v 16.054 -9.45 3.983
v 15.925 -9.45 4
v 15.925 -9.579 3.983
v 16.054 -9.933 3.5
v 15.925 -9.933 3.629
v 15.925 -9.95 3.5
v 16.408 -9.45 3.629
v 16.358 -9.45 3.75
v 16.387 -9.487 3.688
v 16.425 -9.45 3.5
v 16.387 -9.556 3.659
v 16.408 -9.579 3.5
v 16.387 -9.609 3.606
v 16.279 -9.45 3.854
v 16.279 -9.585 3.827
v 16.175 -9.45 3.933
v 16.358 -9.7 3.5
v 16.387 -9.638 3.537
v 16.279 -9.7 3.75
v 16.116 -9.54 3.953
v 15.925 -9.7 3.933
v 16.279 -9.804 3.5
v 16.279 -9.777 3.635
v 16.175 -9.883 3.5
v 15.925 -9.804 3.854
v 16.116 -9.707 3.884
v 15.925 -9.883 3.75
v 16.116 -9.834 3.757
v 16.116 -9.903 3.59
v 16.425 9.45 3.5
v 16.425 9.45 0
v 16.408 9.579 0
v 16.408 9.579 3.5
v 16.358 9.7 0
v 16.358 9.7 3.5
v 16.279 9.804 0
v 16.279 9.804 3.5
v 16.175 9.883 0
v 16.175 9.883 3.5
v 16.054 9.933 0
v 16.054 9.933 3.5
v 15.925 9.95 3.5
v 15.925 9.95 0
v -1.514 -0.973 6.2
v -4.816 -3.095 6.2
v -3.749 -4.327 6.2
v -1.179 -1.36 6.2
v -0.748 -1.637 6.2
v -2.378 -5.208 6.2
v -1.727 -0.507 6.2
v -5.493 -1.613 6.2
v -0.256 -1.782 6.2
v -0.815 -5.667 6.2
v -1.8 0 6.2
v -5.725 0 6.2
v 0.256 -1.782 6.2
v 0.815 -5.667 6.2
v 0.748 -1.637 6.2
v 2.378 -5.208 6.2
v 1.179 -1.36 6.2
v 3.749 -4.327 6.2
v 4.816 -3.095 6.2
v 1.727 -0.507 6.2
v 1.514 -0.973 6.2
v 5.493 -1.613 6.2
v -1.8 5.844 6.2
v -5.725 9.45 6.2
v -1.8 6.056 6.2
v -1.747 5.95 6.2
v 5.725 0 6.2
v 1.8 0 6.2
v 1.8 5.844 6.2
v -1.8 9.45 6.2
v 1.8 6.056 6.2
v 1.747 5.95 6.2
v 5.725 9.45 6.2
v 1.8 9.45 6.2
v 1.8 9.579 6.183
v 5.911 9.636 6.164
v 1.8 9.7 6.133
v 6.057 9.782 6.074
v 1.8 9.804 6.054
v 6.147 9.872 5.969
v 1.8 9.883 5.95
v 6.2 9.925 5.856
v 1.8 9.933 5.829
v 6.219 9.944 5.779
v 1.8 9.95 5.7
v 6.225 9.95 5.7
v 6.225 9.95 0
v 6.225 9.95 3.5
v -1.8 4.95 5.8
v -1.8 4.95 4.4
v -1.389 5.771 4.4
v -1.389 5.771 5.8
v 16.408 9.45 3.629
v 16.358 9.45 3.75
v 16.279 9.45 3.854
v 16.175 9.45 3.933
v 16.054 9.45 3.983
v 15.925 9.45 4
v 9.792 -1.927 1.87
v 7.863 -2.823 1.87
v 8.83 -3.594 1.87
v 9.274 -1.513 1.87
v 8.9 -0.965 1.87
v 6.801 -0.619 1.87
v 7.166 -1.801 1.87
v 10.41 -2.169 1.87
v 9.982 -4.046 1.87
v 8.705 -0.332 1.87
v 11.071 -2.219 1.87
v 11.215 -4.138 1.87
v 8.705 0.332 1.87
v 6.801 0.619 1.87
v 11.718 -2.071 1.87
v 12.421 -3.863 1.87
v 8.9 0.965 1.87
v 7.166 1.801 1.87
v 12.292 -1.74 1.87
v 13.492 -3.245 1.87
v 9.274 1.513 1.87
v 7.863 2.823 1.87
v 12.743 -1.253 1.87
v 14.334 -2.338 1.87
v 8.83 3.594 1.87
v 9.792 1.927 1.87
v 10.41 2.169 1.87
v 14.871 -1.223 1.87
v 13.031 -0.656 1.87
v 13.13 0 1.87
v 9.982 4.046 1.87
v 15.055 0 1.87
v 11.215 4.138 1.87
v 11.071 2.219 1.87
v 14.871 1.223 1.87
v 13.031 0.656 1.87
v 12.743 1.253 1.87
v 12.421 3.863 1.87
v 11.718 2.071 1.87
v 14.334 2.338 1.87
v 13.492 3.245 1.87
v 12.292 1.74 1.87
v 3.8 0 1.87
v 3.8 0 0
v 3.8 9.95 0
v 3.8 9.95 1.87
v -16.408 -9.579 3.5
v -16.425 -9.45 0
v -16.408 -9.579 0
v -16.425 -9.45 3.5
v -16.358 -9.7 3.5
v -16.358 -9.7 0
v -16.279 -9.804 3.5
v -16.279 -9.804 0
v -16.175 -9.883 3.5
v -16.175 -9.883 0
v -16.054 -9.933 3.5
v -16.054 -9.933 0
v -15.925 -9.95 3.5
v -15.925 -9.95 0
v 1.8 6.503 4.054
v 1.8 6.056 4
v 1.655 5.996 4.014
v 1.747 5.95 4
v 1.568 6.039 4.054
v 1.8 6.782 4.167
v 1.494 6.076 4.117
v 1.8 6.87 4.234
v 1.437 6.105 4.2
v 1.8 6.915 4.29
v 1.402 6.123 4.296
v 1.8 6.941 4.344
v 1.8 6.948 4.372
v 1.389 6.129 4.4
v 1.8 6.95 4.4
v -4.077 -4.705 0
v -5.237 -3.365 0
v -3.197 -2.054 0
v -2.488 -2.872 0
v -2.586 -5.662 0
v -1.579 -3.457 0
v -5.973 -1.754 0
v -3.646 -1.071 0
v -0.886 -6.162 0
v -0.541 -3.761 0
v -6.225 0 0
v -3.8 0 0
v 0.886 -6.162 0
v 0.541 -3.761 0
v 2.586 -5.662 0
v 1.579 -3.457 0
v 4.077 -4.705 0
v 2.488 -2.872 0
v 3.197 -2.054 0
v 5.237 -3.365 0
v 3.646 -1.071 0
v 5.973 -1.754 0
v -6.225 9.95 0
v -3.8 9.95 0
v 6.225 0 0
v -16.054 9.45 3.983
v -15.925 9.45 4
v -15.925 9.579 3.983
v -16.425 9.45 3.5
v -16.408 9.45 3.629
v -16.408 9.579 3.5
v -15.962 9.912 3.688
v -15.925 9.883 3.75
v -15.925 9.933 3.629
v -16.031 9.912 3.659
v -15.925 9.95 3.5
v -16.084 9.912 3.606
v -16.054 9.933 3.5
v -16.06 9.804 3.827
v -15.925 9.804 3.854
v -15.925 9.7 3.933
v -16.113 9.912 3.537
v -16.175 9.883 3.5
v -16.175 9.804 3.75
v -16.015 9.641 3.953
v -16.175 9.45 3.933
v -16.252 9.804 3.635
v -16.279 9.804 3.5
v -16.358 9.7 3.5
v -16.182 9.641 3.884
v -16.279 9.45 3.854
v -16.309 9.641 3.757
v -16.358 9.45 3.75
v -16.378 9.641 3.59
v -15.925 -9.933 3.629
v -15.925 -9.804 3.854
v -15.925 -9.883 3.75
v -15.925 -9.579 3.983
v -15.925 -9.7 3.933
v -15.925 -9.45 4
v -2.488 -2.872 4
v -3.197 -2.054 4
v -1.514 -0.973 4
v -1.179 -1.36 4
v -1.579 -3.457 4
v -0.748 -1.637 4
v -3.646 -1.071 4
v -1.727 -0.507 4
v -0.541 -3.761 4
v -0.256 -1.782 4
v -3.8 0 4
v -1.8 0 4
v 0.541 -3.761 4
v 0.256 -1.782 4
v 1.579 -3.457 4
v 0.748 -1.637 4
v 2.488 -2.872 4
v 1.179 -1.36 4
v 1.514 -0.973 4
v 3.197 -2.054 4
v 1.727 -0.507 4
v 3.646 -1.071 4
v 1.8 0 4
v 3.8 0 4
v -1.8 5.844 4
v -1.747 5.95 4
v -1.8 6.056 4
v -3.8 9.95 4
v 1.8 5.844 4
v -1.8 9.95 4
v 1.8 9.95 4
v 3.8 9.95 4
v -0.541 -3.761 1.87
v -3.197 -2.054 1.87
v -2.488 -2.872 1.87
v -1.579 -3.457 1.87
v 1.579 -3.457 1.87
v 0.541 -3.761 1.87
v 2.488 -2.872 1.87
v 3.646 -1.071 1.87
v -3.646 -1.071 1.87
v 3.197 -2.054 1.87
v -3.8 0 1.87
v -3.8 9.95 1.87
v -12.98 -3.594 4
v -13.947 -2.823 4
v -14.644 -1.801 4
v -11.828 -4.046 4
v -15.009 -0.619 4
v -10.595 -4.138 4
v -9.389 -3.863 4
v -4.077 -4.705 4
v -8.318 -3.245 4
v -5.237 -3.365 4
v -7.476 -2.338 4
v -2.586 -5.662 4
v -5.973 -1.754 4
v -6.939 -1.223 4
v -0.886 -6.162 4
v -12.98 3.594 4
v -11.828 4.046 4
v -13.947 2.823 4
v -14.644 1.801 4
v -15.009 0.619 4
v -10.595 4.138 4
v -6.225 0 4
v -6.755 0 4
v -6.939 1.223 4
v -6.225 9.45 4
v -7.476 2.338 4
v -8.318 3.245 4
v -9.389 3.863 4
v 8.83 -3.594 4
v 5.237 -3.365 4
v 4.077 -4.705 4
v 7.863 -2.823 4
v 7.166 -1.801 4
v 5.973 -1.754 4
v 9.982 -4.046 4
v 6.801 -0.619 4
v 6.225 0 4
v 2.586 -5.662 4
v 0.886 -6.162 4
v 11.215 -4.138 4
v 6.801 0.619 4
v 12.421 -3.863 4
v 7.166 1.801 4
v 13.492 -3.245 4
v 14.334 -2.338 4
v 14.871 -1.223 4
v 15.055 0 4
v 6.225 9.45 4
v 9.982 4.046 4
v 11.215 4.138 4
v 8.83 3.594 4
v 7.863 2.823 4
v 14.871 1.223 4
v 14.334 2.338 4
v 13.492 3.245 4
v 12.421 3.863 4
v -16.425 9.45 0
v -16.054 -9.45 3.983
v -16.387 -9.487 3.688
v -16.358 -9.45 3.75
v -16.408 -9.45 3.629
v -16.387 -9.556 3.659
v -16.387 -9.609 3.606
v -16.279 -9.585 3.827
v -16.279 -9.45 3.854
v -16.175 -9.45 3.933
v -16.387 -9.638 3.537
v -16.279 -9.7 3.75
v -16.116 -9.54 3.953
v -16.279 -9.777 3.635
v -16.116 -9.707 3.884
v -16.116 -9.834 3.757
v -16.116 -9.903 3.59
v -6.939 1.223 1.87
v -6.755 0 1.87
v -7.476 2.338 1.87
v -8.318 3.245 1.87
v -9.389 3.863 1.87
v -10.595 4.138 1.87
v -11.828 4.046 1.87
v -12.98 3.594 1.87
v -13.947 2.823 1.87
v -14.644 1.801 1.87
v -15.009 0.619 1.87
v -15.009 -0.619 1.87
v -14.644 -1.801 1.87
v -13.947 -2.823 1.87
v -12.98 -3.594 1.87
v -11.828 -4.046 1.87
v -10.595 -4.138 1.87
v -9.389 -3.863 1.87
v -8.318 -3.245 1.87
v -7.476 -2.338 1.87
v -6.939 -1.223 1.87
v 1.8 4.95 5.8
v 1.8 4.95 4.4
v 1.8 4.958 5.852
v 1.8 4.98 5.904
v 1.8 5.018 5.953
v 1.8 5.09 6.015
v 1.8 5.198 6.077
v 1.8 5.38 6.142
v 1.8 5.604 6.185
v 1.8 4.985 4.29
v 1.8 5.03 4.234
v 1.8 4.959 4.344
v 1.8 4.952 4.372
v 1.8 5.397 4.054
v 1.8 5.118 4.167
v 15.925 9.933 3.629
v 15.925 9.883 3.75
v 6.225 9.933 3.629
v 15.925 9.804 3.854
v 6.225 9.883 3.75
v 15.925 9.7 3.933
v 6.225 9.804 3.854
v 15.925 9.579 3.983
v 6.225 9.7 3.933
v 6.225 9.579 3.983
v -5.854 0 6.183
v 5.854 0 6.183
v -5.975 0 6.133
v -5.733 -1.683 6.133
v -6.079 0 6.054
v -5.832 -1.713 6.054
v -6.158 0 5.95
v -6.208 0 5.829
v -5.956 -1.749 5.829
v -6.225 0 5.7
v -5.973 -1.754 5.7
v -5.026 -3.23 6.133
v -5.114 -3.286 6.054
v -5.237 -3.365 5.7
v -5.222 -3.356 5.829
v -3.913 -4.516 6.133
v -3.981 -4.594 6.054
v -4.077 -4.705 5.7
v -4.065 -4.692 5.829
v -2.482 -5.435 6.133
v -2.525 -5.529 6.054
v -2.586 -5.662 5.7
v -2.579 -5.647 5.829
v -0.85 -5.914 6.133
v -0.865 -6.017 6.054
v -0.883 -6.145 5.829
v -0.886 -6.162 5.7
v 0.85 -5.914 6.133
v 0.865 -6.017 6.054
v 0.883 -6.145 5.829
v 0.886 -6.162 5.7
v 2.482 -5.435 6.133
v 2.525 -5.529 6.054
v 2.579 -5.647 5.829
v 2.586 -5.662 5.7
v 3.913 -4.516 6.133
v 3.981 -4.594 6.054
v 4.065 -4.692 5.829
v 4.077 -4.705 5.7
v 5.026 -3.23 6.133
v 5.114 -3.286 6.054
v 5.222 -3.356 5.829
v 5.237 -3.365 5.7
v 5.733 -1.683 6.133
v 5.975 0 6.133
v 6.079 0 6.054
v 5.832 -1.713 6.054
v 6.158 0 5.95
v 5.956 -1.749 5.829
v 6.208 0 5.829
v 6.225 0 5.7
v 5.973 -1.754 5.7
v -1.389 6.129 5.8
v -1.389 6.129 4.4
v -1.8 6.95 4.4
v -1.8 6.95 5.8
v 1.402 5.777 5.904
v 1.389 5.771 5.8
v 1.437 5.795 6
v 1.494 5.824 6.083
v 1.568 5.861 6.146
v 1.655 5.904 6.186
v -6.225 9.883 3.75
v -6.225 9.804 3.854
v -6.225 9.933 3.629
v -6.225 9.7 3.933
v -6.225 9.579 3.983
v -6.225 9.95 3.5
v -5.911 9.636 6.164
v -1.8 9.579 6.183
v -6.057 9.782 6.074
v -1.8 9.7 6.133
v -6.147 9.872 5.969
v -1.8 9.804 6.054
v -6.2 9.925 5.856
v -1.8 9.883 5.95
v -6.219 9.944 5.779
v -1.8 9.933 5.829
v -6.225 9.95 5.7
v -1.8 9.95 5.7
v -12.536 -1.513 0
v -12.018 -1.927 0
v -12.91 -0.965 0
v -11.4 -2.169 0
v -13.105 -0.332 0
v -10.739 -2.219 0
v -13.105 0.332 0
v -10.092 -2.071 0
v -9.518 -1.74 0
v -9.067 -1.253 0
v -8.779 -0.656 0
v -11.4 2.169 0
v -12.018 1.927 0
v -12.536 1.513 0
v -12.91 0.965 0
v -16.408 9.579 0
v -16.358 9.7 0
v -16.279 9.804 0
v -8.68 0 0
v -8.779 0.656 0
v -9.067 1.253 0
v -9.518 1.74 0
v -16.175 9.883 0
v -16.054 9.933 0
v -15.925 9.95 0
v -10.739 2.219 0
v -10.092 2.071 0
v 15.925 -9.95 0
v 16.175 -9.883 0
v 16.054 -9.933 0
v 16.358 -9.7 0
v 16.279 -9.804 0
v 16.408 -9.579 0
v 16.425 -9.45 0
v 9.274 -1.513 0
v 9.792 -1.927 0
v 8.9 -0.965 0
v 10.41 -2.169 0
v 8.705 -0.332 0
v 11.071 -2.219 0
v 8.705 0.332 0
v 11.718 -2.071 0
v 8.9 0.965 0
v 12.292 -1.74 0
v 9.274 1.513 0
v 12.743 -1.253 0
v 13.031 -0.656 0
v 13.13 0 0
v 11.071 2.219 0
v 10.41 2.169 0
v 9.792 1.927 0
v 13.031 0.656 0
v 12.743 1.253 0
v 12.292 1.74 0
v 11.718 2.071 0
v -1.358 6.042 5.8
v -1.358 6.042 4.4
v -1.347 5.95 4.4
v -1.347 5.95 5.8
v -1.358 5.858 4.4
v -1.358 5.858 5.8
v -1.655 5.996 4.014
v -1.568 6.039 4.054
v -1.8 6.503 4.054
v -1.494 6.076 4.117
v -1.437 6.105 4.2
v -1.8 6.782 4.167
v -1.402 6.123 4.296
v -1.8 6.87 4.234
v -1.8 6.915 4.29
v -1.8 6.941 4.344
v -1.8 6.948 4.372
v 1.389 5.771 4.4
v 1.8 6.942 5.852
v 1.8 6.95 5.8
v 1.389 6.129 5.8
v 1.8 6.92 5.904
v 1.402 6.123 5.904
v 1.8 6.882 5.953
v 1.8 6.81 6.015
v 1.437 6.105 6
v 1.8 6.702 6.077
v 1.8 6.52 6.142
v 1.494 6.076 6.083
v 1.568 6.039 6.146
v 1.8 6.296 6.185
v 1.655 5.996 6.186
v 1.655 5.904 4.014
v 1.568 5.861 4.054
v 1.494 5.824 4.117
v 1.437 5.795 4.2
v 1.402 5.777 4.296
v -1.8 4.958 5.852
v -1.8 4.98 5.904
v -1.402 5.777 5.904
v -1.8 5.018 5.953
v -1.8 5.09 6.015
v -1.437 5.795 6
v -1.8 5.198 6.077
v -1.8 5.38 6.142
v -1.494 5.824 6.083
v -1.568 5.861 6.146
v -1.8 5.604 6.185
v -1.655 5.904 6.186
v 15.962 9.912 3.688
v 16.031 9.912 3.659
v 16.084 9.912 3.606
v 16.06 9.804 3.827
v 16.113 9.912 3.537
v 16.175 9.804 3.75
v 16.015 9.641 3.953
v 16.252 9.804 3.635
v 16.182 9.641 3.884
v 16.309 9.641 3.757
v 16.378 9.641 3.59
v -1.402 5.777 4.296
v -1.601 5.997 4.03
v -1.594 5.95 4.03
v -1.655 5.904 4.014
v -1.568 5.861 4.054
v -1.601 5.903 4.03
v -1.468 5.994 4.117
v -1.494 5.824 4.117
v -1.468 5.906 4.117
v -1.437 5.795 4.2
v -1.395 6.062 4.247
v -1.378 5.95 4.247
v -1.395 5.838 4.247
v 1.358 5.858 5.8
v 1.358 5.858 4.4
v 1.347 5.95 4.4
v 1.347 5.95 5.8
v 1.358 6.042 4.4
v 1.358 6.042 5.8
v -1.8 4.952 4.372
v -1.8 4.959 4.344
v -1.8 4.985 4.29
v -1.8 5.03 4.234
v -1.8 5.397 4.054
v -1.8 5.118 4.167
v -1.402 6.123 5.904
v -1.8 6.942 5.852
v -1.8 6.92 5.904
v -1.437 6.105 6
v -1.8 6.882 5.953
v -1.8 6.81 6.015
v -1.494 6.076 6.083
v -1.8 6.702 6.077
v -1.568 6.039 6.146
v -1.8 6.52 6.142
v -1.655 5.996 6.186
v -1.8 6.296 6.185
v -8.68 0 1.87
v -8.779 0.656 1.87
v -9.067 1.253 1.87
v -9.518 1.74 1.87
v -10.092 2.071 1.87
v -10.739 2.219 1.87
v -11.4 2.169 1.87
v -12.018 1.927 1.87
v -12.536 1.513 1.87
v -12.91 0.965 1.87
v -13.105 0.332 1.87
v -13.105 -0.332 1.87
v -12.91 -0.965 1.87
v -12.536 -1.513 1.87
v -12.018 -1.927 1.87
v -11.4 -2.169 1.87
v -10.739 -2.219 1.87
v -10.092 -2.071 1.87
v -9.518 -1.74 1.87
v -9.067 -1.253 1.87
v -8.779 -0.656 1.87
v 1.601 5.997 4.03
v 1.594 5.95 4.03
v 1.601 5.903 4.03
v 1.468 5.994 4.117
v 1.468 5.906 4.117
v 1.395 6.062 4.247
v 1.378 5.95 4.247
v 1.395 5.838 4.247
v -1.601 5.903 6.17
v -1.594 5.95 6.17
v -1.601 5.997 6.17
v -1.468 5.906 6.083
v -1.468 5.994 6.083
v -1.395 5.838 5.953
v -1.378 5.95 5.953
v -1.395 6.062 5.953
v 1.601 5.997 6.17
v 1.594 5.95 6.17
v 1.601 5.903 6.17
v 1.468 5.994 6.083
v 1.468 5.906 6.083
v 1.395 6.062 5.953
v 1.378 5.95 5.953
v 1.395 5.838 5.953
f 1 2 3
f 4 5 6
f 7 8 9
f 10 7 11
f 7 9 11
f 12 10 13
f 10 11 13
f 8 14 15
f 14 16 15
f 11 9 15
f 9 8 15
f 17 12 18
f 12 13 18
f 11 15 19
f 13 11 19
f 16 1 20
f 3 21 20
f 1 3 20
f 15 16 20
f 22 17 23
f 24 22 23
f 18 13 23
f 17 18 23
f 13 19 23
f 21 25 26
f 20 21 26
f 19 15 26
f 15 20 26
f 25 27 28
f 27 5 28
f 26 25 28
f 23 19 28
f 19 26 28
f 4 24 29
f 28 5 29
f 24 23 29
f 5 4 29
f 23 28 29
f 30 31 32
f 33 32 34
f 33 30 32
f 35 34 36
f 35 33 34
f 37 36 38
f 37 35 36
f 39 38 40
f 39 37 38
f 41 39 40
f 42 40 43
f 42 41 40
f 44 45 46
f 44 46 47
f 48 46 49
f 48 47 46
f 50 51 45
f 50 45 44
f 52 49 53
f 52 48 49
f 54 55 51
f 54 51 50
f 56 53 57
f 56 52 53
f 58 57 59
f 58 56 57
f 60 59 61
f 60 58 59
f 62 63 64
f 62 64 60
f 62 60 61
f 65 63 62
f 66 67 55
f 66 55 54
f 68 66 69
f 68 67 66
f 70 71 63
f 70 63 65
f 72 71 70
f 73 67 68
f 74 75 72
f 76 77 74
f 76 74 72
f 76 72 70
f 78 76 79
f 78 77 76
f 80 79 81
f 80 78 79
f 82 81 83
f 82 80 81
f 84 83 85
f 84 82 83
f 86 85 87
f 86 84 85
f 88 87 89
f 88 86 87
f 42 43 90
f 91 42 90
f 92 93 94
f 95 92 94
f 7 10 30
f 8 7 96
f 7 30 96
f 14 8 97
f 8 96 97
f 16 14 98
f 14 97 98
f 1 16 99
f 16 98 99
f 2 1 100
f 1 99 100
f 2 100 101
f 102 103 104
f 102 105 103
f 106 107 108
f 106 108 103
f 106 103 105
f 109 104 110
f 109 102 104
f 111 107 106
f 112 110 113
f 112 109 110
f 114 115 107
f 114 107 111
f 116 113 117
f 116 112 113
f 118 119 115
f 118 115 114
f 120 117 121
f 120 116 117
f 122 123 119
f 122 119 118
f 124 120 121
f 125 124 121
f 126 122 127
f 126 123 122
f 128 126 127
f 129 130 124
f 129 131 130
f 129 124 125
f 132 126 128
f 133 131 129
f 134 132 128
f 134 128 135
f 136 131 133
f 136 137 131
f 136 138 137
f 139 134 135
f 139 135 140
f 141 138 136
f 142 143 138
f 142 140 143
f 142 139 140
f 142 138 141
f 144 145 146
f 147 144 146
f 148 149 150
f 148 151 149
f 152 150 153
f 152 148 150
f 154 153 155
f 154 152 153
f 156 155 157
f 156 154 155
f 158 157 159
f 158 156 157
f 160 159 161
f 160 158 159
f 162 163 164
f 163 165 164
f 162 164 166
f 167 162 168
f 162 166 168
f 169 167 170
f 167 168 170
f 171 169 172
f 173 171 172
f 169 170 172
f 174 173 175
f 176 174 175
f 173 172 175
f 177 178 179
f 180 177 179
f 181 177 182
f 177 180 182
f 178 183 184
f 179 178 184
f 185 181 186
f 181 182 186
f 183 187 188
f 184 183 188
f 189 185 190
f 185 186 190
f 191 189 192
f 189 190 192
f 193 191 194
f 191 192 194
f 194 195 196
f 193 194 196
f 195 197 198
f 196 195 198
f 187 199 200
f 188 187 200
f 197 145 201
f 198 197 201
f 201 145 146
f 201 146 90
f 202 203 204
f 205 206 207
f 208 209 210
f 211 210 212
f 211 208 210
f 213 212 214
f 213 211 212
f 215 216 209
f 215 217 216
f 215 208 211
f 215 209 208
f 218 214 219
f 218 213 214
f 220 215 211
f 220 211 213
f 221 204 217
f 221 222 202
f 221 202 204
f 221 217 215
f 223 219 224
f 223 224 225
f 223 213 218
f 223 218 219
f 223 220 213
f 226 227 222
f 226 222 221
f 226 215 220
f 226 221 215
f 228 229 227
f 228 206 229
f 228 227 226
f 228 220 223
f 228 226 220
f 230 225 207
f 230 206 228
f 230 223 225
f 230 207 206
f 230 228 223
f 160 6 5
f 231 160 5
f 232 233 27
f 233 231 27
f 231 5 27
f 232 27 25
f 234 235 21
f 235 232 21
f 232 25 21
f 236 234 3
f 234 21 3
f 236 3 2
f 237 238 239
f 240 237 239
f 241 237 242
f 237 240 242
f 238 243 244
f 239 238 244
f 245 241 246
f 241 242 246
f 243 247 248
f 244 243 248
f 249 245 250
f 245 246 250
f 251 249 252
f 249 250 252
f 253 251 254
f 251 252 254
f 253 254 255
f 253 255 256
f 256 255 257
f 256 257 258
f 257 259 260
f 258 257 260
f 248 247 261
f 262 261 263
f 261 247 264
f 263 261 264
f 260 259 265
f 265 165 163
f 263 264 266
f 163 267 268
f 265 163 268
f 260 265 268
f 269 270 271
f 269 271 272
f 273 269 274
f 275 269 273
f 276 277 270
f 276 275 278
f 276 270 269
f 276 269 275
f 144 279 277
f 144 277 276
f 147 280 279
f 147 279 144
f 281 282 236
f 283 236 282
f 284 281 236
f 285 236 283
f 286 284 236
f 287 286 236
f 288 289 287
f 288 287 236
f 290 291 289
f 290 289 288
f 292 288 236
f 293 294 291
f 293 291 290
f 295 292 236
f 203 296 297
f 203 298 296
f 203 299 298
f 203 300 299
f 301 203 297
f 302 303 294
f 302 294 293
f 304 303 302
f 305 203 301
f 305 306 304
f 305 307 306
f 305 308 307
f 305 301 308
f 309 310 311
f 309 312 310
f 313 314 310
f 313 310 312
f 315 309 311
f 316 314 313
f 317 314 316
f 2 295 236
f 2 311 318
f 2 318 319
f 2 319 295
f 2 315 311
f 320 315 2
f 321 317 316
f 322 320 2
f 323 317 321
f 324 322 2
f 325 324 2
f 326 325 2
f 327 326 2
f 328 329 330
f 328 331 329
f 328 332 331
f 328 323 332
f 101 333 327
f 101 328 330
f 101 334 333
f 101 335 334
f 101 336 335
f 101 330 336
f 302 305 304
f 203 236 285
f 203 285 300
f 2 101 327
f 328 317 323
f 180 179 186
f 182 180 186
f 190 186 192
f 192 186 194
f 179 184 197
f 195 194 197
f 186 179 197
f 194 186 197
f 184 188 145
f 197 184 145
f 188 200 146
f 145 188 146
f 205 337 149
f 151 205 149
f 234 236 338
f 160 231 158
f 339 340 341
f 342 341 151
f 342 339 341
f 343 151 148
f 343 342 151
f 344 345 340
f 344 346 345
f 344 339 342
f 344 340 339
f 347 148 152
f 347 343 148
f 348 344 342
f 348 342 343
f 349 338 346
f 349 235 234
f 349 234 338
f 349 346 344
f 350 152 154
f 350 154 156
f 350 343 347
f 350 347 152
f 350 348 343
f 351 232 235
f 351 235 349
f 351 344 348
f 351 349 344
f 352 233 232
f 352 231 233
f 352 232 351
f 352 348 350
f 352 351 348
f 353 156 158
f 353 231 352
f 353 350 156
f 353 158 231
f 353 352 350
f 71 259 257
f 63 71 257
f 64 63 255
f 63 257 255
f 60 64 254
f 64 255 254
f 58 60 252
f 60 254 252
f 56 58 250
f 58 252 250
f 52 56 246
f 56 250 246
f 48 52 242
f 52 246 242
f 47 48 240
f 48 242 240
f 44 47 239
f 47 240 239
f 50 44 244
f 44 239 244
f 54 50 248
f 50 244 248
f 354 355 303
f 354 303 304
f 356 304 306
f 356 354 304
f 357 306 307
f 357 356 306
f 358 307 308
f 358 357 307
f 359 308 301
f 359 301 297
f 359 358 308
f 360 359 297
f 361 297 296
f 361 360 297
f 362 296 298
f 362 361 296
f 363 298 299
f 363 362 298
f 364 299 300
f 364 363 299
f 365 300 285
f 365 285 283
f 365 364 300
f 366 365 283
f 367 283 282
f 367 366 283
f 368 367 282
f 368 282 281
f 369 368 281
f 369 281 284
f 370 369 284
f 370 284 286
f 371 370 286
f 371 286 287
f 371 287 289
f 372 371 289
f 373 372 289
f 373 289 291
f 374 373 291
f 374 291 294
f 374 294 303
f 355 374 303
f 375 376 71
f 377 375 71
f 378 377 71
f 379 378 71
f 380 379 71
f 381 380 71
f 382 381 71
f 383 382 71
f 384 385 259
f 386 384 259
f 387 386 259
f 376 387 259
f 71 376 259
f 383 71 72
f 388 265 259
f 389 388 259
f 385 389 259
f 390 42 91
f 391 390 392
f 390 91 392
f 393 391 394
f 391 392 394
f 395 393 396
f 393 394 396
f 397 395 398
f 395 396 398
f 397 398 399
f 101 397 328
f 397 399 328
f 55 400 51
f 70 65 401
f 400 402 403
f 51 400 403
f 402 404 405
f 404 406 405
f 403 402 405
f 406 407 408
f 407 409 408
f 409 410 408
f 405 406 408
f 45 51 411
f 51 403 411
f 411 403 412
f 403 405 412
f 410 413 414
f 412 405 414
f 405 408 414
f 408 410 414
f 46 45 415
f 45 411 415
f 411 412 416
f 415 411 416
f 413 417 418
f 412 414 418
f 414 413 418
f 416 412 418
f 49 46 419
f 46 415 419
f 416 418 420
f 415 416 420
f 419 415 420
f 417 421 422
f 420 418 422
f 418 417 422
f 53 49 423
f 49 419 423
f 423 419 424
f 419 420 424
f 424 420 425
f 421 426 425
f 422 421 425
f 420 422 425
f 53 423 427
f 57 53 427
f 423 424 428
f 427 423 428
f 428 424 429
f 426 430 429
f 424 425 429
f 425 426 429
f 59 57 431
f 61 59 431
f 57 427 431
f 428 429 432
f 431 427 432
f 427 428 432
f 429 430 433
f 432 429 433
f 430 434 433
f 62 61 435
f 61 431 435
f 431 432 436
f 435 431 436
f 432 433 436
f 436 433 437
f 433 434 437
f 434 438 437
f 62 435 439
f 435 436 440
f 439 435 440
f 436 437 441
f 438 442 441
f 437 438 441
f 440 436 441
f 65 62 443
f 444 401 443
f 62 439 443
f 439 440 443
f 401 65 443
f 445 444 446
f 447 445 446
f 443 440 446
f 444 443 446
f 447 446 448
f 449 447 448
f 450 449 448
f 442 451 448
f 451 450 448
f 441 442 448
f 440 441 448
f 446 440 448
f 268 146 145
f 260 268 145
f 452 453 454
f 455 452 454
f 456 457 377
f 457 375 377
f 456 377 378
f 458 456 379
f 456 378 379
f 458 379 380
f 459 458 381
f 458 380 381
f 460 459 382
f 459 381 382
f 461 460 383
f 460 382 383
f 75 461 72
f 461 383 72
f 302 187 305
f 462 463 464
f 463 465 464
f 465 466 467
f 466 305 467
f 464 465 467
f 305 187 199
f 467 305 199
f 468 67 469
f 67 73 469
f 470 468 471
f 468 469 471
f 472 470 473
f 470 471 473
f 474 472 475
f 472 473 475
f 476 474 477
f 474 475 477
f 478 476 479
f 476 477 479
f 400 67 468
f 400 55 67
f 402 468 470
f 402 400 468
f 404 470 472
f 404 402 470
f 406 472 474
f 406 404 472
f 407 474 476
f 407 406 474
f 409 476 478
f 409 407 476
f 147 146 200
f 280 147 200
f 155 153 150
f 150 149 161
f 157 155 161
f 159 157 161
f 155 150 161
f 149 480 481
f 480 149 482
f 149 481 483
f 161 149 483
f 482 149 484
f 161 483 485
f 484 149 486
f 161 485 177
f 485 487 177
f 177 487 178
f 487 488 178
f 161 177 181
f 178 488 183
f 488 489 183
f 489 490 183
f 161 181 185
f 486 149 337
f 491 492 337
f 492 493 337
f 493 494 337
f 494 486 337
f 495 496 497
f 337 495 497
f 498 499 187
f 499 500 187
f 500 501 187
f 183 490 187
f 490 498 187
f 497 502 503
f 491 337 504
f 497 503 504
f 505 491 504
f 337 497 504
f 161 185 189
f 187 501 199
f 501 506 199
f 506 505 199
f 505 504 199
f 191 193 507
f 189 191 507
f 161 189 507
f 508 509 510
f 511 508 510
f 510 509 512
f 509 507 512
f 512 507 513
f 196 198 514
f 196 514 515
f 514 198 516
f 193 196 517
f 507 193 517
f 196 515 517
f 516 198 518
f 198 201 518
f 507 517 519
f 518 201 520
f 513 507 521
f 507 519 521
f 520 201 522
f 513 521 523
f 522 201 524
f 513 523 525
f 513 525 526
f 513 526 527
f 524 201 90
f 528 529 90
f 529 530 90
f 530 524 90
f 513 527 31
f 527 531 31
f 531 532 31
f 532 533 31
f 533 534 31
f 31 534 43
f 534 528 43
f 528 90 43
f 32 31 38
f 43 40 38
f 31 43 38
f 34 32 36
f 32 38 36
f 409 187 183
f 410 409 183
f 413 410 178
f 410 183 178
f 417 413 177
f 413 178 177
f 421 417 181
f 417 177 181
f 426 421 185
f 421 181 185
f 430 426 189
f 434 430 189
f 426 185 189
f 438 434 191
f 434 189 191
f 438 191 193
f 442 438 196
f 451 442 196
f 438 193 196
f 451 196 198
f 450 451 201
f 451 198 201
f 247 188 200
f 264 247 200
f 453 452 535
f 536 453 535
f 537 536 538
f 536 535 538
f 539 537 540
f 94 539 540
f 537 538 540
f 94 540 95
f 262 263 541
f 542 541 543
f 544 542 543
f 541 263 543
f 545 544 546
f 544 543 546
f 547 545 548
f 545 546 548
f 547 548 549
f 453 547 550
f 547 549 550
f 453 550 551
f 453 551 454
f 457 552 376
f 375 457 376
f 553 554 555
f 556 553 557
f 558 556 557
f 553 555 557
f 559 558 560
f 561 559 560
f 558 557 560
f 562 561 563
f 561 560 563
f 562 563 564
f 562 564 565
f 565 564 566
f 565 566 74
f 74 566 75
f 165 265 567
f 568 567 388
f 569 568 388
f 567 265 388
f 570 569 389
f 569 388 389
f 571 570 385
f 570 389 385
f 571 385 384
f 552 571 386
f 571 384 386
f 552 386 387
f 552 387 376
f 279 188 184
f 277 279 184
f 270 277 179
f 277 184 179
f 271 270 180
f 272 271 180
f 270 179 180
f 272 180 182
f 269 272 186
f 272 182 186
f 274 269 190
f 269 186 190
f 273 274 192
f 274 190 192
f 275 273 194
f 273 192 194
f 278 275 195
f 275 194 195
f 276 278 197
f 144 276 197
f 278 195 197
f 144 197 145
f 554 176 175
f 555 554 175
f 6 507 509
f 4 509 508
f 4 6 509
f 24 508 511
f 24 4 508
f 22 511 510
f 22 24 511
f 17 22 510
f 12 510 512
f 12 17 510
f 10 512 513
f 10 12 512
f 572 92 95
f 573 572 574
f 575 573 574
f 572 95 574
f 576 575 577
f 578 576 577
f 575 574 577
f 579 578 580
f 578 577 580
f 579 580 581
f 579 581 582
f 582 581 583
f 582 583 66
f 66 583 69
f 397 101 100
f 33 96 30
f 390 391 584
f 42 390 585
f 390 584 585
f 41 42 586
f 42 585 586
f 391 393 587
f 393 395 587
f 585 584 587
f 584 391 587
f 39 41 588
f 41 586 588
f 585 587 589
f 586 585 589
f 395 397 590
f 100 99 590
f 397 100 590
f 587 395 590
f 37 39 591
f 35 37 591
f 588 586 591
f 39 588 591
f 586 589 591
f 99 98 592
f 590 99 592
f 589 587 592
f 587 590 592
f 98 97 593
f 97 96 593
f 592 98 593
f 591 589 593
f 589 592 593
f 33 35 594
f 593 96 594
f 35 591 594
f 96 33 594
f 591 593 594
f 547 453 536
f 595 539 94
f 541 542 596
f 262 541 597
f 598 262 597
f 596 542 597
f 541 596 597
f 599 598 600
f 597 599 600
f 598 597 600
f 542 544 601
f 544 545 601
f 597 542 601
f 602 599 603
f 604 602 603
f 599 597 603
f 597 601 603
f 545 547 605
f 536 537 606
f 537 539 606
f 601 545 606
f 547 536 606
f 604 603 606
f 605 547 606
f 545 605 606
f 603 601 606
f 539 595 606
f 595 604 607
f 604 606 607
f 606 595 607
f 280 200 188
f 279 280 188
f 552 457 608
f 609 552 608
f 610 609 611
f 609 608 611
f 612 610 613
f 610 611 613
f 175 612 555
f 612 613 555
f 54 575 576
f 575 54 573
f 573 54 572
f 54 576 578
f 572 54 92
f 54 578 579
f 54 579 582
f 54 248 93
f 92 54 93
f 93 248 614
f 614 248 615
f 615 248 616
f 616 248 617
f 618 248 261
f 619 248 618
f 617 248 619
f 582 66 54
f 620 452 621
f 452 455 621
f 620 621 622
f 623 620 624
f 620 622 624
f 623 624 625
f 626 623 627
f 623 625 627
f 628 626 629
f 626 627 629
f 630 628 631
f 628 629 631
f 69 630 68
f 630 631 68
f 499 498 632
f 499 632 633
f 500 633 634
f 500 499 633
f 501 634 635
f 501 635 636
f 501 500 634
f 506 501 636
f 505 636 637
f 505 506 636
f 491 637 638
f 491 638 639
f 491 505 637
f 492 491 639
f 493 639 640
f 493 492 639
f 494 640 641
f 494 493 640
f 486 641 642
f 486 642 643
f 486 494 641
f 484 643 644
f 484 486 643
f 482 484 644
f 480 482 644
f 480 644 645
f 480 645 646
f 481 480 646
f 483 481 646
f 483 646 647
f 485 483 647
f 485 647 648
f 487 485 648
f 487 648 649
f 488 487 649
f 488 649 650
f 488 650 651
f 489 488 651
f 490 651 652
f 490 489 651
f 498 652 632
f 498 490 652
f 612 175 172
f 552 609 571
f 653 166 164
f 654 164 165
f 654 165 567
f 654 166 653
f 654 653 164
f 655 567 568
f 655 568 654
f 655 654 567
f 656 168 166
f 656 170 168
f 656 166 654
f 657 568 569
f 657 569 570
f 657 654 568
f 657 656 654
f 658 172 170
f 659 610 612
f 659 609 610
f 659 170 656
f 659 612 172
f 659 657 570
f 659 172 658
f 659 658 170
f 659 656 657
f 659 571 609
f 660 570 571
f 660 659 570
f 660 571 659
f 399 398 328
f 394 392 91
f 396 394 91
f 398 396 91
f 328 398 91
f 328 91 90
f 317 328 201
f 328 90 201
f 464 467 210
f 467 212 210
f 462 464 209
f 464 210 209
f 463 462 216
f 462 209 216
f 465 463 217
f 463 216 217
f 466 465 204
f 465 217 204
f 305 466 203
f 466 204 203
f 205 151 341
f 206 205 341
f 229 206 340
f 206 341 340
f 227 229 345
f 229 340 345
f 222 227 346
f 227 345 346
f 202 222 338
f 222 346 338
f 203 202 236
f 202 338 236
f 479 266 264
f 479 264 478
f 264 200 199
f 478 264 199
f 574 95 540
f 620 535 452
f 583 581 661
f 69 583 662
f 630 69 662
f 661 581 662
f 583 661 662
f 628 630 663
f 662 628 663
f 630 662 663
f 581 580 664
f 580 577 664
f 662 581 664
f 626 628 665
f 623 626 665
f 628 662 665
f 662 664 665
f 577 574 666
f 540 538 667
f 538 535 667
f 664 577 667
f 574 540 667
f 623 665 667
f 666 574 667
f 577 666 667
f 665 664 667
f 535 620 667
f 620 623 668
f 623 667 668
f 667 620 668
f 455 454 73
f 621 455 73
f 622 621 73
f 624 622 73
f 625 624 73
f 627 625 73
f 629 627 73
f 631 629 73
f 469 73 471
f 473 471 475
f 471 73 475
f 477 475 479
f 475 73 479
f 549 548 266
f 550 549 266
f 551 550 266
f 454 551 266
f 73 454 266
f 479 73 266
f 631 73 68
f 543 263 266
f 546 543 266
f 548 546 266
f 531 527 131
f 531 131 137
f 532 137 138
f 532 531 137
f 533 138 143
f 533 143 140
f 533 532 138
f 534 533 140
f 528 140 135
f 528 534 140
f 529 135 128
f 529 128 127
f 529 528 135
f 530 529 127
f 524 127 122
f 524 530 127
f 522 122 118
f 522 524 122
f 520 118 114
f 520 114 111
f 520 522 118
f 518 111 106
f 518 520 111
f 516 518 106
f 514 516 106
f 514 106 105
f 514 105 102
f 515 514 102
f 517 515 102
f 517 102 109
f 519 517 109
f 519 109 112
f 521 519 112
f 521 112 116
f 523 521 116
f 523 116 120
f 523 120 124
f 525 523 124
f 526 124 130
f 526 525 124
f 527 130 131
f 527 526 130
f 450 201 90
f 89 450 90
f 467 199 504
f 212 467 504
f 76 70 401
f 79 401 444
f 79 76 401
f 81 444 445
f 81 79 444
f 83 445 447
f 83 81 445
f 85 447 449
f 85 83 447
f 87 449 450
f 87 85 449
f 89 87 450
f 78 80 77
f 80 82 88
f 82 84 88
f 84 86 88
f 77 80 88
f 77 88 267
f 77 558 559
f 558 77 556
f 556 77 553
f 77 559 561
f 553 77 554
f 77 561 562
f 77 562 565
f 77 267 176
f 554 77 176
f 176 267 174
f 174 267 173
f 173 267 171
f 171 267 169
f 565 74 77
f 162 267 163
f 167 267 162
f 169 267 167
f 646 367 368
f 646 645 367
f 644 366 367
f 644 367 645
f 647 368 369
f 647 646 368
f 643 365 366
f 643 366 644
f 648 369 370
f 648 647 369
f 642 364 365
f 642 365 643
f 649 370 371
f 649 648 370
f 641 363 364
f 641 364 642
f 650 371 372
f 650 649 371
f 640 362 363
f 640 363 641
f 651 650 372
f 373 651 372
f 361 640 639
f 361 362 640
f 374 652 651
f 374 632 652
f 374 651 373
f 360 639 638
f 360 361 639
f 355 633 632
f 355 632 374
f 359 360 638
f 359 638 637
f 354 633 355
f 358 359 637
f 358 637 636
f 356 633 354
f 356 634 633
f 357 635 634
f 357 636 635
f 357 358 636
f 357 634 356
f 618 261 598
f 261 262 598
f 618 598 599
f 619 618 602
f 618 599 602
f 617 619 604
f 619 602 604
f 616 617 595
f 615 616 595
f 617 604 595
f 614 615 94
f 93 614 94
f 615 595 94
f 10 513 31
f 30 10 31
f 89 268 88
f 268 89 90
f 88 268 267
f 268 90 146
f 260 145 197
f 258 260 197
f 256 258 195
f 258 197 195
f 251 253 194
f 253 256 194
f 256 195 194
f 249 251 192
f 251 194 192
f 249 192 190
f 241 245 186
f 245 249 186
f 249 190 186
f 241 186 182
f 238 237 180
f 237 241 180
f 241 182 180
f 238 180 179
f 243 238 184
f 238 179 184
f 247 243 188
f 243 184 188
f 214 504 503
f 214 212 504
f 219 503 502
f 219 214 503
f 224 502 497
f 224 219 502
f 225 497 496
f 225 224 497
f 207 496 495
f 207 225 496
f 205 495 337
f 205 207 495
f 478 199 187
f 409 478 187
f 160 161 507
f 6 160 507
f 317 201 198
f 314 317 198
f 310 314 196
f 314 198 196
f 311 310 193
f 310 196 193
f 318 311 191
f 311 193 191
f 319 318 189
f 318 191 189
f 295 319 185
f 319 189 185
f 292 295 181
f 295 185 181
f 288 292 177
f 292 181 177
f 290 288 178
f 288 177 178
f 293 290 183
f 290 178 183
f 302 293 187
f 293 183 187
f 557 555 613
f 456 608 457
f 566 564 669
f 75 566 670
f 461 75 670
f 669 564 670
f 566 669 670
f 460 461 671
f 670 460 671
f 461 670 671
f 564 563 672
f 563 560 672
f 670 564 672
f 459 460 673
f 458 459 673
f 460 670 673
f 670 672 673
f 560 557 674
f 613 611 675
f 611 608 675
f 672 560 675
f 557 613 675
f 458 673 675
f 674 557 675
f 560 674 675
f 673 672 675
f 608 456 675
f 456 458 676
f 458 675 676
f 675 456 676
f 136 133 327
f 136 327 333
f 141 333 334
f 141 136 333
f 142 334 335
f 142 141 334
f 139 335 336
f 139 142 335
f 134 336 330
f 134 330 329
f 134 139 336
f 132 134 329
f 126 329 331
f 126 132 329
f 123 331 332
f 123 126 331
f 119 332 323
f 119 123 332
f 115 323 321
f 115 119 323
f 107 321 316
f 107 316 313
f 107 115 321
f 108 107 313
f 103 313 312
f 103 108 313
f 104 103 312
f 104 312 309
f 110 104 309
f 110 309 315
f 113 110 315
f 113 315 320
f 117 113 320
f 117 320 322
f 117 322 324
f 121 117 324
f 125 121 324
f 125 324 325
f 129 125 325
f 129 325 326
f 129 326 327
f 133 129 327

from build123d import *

# Parameters (mm, degrees)
F0_R     = 4.15
F1_DEPTH = 4
F0_R_2   = 2.225
F2_DEPTH = 1.87
F3_DEPTH = 6.2
F4_START = 4
F4_DEPTH = 2.2
F5_R     = 0.4
F6_R     = 0.5
F6_2_R   = 0.5


with BuildPart() as f1:
    # F0 (on Top) → F1 (new body)
    with BuildSketch(Plane.XY):
        with BuildLine():
            Line((-6.225, 9.95), (-16.425, 9.95))
            Line((-16.425, 9.95), (-16.425, -9.95))
            Line((-16.425, -9.95), (16.425, -9.95))
            Line((16.425, -9.95), (16.425, 9.95))
            Line((16.425, 9.95), (6.225, 9.95))
            Line((6.225, 9.95), (6.225, 0))
            ThreePointArc((6.225, 0), (0, -6.225), (-6.225, 0))
            Line((-6.225, 0), (-6.225, 9.95))
        make_face()
        with Locations((-10.905, 0)):
            Circle(F0_R, mode=Mode.SUBTRACT)
        with Locations((10.905, 0)):
            Circle(F0_R, mode=Mode.SUBTRACT)
    extrude(amount=F1_DEPTH)

    # F0 (on Top) → F2 (join)
    with BuildSketch(Plane.XY):
        with Locations((-10.905, 0)):
            Circle(F0_R)
        with Locations((-10.905, 0)):
            Circle(F0_R_2, mode=Mode.SUBTRACT)
        with Locations((10.905, 0)):
            Circle(F0_R)
        with Locations((10.905, 0)):
            Circle(F0_R_2, mode=Mode.SUBTRACT)
    extrude(amount=F2_DEPTH)

    # F6
    f6_edges = [f1.edges().sort_by_distance(p)[0] for p in [
        (0, -9.95, 4),
        (16.425, 0, 4),
        (-16.425, 0, 4),
        (-11.325, 9.95, 4),
        (11.325, 9.95, 4),
        (16.425, -9.95, 2),
        (-16.425, -9.95, 2),
        (16.425, 9.95, 2),
        (-16.425, 9.95, 2),
    ]]
    fillet(f6_edges, radius=F6_R)


with BuildPart() as f2:
    # F0 (on Top) → F2, piece 2 (new body)
    with BuildSketch(Plane.XY):
        with BuildLine():
            ThreePointArc((-1.8, 5.9590792074), (-2.8468319847, 5.5358985405), (-3.8, 4.9305805946))
            Line((-3.8, 4.9305805946), (-3.8, 0))
            ThreePointArc((-3.8, 0), (-3.2619012861, 1.949358869), (-1.8, 3.3466401061))
            Line((-1.8, 3.3466401061), (-1.8, 4.95))
            Line((-1.8, 4.95), (-1.8, 5.9590792074))
        make_face()
        with BuildLine():
            ThreePointArc((1.8, 3.3466401061), (0, 3.8), (-1.8, 3.3466401061))
            Line((-1.8, 3.3466401061), (-1.8, 0))
            ThreePointArc((-1.8, 0), (0, 1.8), (1.8, 0))
            Line((1.8, 0), (1.8, 3.3466401061))
        make_face()
        with BuildLine():
            ThreePointArc((-1.8, 3.3466401061), (-3.2619012861, 1.949358869), (-3.8, 0))
            ThreePointArc((-3.8, 0), (0, -3.8), (3.8, 0))
            ThreePointArc((3.8, 0), (3.2619012861, 1.949358869), (1.8, 3.3466401061))
            Line((1.8, 3.3466401061), (1.8, 0))
            ThreePointArc((1.8, 0), (0, -1.8), (-1.8, 0))
            Line((-1.8, 0), (-1.8, 3.3466401061))
        make_face()
        with BuildLine():
            ThreePointArc((1.8, 0), (0, 1.8), (-1.8, 0))
            ThreePointArc((-1.8, 0), (0, -1.8), (1.8, 0))
        make_face()
        with BuildLine():
            ThreePointArc((1.3620779041, 6.0741558083), (0, 6.225), (-1.3620779041, 6.0741558083))
            Line((-1.3620779041, 6.0741558083), (-1.3, 5.95))
            Line((-1.3, 5.95), (-1.8, 4.95))
            Line((-1.8, 4.95), (-1.8, 3.3466401061))
            ThreePointArc((-1.8, 3.3466401061), (0, 3.8), (1.8, 3.3466401061))
            Line((1.8, 3.3466401061), (1.8, 4.95))
            Line((1.8, 4.95), (1.3, 5.95))
            Line((1.3, 5.95), (1.3620779041, 6.0741558083))
        make_face()
        with BuildLine():
            Line((1.8, 9.95), (-1.8, 9.95))
            Line((-1.8, 9.95), (-1.8, 6.95))
            Line((-1.8, 6.95), (-1.3620779041, 6.0741558083))
            ThreePointArc((-1.3620779041, 6.0741558083), (0, 6.225), (1.3620779041, 6.0741558083))
            Line((1.3620779041, 6.0741558083), (1.8, 6.95))
            Line((1.8, 6.95), (1.8, 9.95))
        make_face()
        with BuildLine():
            Line((-1.8, 9.95), (-3.8, 9.95))
            Line((-3.8, 9.95), (-3.8, 4.9305805946))
            ThreePointArc((-3.8, 4.9305805946), (-2.8468319847, 5.5358985405), (-1.8, 5.9590792074))
            Line((-1.8, 5.9590792074), (-1.8, 6.95))
            Line((-1.8, 6.95), (-1.8, 9.95))
        make_face()
        with BuildLine():
            Line((3.8, 9.95), (1.8, 9.95))
            Line((1.8, 9.95), (1.8, 6.95))
            Line((1.8, 6.95), (1.8, 5.9590792074))
            ThreePointArc((1.8, 5.9590792074), (2.8468319847, 5.5358985405), (3.8, 4.9305805946))
            Line((3.8, 4.9305805946), (3.8, 9.95))
        make_face()
        with BuildLine():
            Line((3.8, 0), (3.8, 4.9305805946))
            ThreePointArc((3.8, 4.9305805946), (2.8468319847, 5.5358985405), (1.8, 5.9590792074))
            Line((1.8, 5.9590792074), (1.8, 4.95))
            Line((1.8, 4.95), (1.8, 3.3466401061))
            ThreePointArc((1.8, 3.3466401061), (3.2619012861, 1.949358869), (3.8, 0))
        make_face()
        with BuildLine():
            Line((1.8, 4.95), (1.8, 5.9590792074))
            ThreePointArc((1.8, 5.9590792074), (1.5820855931, 6.020600483), (1.3620779041, 6.0741558083))
            Line((1.3620779041, 6.0741558083), (1.3, 5.95))
            Line((1.3, 5.95), (1.8, 4.95))
        make_face()
        with BuildLine():
            Line((1.8, 5.9590792074), (1.8, 6.95))
            Line((1.8, 6.95), (1.3620779041, 6.0741558083))
            ThreePointArc((1.3620779041, 6.0741558083), (1.5820855931, 6.020600483), (1.8, 5.9590792074))
        make_face()
        with BuildLine():
            Line((-1.3620779041, 6.0741558083), (-1.8, 6.95))
            Line((-1.8, 6.95), (-1.8, 5.9590792074))
            ThreePointArc((-1.8, 5.9590792074), (-1.5820855931, 6.020600483), (-1.3620779041, 6.0741558083))
        make_face()
        with BuildLine():
            ThreePointArc((-1.3620779041, 6.0741558083), (-1.5820855931, 6.020600483), (-1.8, 5.9590792074))
            Line((-1.8, 5.9590792074), (-1.8, 4.95))
            Line((-1.8, 4.95), (-1.3, 5.95))
            Line((-1.3, 5.95), (-1.3620779041, 6.0741558083))
        make_face()
    extrude(amount=F2_DEPTH)


with BuildPart() as f3:
    # F0 (on Top) → F3 (new body)
    with BuildSketch(Plane.XY):
        with BuildLine():
            Line((-3.8, 9.95), (-6.225, 9.95))
            Line((-6.225, 9.95), (-6.225, 0))
            ThreePointArc((-6.225, 0), (-5.585947771, 2.7473282476), (-3.8, 4.9305805946))
            Line((-3.8, 4.9305805946), (-3.8, 9.95))
        make_face()
        with BuildLine():
            ThreePointArc((-3.8, 4.9305805946), (-5.585947771, 2.7473282476), (-6.225, 0))
            ThreePointArc((-6.225, 0), (0, -6.225), (6.225, 0))
            ThreePointArc((6.225, 0), (5.585947771, 2.7473282476), (3.8, 4.9305805946))
            Line((3.8, 4.9305805946), (3.8, 0))
            ThreePointArc((3.8, 0), (0, -3.8), (-3.8, 0))
            Line((-3.8, 0), (-3.8, 4.9305805946))
        make_face()
        with BuildLine():
            ThreePointArc((3.8, 4.9305805946), (5.585947771, 2.7473282476), (6.225, 0))
            Line((6.225, 0), (6.225, 9.95))
            Line((6.225, 9.95), (3.8, 9.95))
            Line((3.8, 9.95), (3.8, 4.9305805946))
        make_face()
    extrude(amount=F3_DEPTH)

    # F0 (on Top) → F4 (join)
    with BuildSketch(Plane.XY.offset(F4_START)):
        with BuildLine():
            Line((-1.8, 9.95), (-3.8, 9.95))
            Line((-3.8, 9.95), (-3.8, 4.9305805946))
            ThreePointArc((-3.8, 4.9305805946), (-2.8468319847, 5.5358985405), (-1.8, 5.9590792074))
            Line((-1.8, 5.9590792074), (-1.8, 6.95))
            Line((-1.8, 6.95), (-1.8, 9.95))
        make_face()
        with BuildLine():
            ThreePointArc((-1.8, 5.9590792074), (-2.8468319847, 5.5358985405), (-3.8, 4.9305805946))
            Line((-3.8, 4.9305805946), (-3.8, 0))
            ThreePointArc((-3.8, 0), (-3.2619012861, 1.949358869), (-1.8, 3.3466401061))
            Line((-1.8, 3.3466401061), (-1.8, 4.95))
            Line((-1.8, 4.95), (-1.8, 5.9590792074))
        make_face()
        with BuildLine():
            ThreePointArc((-1.8, 3.3466401061), (-3.2619012861, 1.949358869), (-3.8, 0))
            ThreePointArc((-3.8, 0), (0, -3.8), (3.8, 0))
            ThreePointArc((3.8, 0), (3.2619012861, 1.949358869), (1.8, 3.3466401061))
            Line((1.8, 3.3466401061), (1.8, 0))
            ThreePointArc((1.8, 0), (0, -1.8), (-1.8, 0))
            Line((-1.8, 0), (-1.8, 3.3466401061))
        make_face()
        with BuildLine():
            Line((3.8, 0), (3.8, 4.9305805946))
            ThreePointArc((3.8, 4.9305805946), (2.8468319847, 5.5358985405), (1.8, 5.9590792074))
            Line((1.8, 5.9590792074), (1.8, 4.95))
            Line((1.8, 4.95), (1.8, 3.3466401061))
            ThreePointArc((1.8, 3.3466401061), (3.2619012861, 1.949358869), (3.8, 0))
        make_face()
        with BuildLine():
            Line((3.8, 9.95), (1.8, 9.95))
            Line((1.8, 9.95), (1.8, 6.95))
            Line((1.8, 6.95), (1.8, 5.9590792074))
            ThreePointArc((1.8, 5.9590792074), (2.8468319847, 5.5358985405), (3.8, 4.9305805946))
            Line((3.8, 4.9305805946), (3.8, 9.95))
        make_face()
        with BuildLine():
            Line((-1.3620779041, 6.0741558083), (-1.8, 6.95))
            Line((-1.8, 6.95), (-1.8, 5.9590792074))
            ThreePointArc((-1.8, 5.9590792074), (-1.5820855931, 6.020600483), (-1.3620779041, 6.0741558083))
        make_face()
        with BuildLine():
            ThreePointArc((-1.3620779041, 6.0741558083), (-1.5820855931, 6.020600483), (-1.8, 5.9590792074))
            Line((-1.8, 5.9590792074), (-1.8, 4.95))
            Line((-1.8, 4.95), (-1.3, 5.95))
            Line((-1.3, 5.95), (-1.3620779041, 6.0741558083))
        make_face()
        with BuildLine():
            Line((1.8, 4.95), (1.8, 5.9590792074))
            ThreePointArc((1.8, 5.9590792074), (1.5820855931, 6.020600483), (1.3620779041, 6.0741558083))
            Line((1.3620779041, 6.0741558083), (1.3, 5.95))
            Line((1.3, 5.95), (1.8, 4.95))
        make_face()
        with BuildLine():
            Line((1.8, 5.9590792074), (1.8, 6.95))
            Line((1.8, 6.95), (1.3620779041, 6.0741558083))
            ThreePointArc((1.3620779041, 6.0741558083), (1.5820855931, 6.020600483), (1.8, 5.9590792074))
        make_face()
    extrude(amount=F4_DEPTH)

    # F5
    f5_edges = [f3.edges().sort_by_distance(p)[0] for p in [
        (1.55, 6.45, 6.2),
        (1.55, 5.45, 6.2),
        (-1.55, 5.45, 6.2),
        (-1.55, 6.45, 6.2),
        (-1.55, 6.45, 4),
        (1.55, 6.45, 4),
        (-1.55, 5.45, 4),
        (1.55, 5.45, 4),
        (-1.3, 5.95, 5.1),
        (1.3, 5.95, 5.1),
    ]]
    fillet(f5_edges, radius=F5_R)

    # F6#2
    f6_2_edges = [f3.edges().sort_by_distance(p)[0] for p in [
        (-4.0125, 9.95, 6.2),
        (4.0125, 9.95, 6.2),
        (6.225, 4.975, 6.2),
    ]]
    fillet(f6_2_edges, radius=F6_2_R)


solid = Compound([f1.part, f2.part, f3.part])
